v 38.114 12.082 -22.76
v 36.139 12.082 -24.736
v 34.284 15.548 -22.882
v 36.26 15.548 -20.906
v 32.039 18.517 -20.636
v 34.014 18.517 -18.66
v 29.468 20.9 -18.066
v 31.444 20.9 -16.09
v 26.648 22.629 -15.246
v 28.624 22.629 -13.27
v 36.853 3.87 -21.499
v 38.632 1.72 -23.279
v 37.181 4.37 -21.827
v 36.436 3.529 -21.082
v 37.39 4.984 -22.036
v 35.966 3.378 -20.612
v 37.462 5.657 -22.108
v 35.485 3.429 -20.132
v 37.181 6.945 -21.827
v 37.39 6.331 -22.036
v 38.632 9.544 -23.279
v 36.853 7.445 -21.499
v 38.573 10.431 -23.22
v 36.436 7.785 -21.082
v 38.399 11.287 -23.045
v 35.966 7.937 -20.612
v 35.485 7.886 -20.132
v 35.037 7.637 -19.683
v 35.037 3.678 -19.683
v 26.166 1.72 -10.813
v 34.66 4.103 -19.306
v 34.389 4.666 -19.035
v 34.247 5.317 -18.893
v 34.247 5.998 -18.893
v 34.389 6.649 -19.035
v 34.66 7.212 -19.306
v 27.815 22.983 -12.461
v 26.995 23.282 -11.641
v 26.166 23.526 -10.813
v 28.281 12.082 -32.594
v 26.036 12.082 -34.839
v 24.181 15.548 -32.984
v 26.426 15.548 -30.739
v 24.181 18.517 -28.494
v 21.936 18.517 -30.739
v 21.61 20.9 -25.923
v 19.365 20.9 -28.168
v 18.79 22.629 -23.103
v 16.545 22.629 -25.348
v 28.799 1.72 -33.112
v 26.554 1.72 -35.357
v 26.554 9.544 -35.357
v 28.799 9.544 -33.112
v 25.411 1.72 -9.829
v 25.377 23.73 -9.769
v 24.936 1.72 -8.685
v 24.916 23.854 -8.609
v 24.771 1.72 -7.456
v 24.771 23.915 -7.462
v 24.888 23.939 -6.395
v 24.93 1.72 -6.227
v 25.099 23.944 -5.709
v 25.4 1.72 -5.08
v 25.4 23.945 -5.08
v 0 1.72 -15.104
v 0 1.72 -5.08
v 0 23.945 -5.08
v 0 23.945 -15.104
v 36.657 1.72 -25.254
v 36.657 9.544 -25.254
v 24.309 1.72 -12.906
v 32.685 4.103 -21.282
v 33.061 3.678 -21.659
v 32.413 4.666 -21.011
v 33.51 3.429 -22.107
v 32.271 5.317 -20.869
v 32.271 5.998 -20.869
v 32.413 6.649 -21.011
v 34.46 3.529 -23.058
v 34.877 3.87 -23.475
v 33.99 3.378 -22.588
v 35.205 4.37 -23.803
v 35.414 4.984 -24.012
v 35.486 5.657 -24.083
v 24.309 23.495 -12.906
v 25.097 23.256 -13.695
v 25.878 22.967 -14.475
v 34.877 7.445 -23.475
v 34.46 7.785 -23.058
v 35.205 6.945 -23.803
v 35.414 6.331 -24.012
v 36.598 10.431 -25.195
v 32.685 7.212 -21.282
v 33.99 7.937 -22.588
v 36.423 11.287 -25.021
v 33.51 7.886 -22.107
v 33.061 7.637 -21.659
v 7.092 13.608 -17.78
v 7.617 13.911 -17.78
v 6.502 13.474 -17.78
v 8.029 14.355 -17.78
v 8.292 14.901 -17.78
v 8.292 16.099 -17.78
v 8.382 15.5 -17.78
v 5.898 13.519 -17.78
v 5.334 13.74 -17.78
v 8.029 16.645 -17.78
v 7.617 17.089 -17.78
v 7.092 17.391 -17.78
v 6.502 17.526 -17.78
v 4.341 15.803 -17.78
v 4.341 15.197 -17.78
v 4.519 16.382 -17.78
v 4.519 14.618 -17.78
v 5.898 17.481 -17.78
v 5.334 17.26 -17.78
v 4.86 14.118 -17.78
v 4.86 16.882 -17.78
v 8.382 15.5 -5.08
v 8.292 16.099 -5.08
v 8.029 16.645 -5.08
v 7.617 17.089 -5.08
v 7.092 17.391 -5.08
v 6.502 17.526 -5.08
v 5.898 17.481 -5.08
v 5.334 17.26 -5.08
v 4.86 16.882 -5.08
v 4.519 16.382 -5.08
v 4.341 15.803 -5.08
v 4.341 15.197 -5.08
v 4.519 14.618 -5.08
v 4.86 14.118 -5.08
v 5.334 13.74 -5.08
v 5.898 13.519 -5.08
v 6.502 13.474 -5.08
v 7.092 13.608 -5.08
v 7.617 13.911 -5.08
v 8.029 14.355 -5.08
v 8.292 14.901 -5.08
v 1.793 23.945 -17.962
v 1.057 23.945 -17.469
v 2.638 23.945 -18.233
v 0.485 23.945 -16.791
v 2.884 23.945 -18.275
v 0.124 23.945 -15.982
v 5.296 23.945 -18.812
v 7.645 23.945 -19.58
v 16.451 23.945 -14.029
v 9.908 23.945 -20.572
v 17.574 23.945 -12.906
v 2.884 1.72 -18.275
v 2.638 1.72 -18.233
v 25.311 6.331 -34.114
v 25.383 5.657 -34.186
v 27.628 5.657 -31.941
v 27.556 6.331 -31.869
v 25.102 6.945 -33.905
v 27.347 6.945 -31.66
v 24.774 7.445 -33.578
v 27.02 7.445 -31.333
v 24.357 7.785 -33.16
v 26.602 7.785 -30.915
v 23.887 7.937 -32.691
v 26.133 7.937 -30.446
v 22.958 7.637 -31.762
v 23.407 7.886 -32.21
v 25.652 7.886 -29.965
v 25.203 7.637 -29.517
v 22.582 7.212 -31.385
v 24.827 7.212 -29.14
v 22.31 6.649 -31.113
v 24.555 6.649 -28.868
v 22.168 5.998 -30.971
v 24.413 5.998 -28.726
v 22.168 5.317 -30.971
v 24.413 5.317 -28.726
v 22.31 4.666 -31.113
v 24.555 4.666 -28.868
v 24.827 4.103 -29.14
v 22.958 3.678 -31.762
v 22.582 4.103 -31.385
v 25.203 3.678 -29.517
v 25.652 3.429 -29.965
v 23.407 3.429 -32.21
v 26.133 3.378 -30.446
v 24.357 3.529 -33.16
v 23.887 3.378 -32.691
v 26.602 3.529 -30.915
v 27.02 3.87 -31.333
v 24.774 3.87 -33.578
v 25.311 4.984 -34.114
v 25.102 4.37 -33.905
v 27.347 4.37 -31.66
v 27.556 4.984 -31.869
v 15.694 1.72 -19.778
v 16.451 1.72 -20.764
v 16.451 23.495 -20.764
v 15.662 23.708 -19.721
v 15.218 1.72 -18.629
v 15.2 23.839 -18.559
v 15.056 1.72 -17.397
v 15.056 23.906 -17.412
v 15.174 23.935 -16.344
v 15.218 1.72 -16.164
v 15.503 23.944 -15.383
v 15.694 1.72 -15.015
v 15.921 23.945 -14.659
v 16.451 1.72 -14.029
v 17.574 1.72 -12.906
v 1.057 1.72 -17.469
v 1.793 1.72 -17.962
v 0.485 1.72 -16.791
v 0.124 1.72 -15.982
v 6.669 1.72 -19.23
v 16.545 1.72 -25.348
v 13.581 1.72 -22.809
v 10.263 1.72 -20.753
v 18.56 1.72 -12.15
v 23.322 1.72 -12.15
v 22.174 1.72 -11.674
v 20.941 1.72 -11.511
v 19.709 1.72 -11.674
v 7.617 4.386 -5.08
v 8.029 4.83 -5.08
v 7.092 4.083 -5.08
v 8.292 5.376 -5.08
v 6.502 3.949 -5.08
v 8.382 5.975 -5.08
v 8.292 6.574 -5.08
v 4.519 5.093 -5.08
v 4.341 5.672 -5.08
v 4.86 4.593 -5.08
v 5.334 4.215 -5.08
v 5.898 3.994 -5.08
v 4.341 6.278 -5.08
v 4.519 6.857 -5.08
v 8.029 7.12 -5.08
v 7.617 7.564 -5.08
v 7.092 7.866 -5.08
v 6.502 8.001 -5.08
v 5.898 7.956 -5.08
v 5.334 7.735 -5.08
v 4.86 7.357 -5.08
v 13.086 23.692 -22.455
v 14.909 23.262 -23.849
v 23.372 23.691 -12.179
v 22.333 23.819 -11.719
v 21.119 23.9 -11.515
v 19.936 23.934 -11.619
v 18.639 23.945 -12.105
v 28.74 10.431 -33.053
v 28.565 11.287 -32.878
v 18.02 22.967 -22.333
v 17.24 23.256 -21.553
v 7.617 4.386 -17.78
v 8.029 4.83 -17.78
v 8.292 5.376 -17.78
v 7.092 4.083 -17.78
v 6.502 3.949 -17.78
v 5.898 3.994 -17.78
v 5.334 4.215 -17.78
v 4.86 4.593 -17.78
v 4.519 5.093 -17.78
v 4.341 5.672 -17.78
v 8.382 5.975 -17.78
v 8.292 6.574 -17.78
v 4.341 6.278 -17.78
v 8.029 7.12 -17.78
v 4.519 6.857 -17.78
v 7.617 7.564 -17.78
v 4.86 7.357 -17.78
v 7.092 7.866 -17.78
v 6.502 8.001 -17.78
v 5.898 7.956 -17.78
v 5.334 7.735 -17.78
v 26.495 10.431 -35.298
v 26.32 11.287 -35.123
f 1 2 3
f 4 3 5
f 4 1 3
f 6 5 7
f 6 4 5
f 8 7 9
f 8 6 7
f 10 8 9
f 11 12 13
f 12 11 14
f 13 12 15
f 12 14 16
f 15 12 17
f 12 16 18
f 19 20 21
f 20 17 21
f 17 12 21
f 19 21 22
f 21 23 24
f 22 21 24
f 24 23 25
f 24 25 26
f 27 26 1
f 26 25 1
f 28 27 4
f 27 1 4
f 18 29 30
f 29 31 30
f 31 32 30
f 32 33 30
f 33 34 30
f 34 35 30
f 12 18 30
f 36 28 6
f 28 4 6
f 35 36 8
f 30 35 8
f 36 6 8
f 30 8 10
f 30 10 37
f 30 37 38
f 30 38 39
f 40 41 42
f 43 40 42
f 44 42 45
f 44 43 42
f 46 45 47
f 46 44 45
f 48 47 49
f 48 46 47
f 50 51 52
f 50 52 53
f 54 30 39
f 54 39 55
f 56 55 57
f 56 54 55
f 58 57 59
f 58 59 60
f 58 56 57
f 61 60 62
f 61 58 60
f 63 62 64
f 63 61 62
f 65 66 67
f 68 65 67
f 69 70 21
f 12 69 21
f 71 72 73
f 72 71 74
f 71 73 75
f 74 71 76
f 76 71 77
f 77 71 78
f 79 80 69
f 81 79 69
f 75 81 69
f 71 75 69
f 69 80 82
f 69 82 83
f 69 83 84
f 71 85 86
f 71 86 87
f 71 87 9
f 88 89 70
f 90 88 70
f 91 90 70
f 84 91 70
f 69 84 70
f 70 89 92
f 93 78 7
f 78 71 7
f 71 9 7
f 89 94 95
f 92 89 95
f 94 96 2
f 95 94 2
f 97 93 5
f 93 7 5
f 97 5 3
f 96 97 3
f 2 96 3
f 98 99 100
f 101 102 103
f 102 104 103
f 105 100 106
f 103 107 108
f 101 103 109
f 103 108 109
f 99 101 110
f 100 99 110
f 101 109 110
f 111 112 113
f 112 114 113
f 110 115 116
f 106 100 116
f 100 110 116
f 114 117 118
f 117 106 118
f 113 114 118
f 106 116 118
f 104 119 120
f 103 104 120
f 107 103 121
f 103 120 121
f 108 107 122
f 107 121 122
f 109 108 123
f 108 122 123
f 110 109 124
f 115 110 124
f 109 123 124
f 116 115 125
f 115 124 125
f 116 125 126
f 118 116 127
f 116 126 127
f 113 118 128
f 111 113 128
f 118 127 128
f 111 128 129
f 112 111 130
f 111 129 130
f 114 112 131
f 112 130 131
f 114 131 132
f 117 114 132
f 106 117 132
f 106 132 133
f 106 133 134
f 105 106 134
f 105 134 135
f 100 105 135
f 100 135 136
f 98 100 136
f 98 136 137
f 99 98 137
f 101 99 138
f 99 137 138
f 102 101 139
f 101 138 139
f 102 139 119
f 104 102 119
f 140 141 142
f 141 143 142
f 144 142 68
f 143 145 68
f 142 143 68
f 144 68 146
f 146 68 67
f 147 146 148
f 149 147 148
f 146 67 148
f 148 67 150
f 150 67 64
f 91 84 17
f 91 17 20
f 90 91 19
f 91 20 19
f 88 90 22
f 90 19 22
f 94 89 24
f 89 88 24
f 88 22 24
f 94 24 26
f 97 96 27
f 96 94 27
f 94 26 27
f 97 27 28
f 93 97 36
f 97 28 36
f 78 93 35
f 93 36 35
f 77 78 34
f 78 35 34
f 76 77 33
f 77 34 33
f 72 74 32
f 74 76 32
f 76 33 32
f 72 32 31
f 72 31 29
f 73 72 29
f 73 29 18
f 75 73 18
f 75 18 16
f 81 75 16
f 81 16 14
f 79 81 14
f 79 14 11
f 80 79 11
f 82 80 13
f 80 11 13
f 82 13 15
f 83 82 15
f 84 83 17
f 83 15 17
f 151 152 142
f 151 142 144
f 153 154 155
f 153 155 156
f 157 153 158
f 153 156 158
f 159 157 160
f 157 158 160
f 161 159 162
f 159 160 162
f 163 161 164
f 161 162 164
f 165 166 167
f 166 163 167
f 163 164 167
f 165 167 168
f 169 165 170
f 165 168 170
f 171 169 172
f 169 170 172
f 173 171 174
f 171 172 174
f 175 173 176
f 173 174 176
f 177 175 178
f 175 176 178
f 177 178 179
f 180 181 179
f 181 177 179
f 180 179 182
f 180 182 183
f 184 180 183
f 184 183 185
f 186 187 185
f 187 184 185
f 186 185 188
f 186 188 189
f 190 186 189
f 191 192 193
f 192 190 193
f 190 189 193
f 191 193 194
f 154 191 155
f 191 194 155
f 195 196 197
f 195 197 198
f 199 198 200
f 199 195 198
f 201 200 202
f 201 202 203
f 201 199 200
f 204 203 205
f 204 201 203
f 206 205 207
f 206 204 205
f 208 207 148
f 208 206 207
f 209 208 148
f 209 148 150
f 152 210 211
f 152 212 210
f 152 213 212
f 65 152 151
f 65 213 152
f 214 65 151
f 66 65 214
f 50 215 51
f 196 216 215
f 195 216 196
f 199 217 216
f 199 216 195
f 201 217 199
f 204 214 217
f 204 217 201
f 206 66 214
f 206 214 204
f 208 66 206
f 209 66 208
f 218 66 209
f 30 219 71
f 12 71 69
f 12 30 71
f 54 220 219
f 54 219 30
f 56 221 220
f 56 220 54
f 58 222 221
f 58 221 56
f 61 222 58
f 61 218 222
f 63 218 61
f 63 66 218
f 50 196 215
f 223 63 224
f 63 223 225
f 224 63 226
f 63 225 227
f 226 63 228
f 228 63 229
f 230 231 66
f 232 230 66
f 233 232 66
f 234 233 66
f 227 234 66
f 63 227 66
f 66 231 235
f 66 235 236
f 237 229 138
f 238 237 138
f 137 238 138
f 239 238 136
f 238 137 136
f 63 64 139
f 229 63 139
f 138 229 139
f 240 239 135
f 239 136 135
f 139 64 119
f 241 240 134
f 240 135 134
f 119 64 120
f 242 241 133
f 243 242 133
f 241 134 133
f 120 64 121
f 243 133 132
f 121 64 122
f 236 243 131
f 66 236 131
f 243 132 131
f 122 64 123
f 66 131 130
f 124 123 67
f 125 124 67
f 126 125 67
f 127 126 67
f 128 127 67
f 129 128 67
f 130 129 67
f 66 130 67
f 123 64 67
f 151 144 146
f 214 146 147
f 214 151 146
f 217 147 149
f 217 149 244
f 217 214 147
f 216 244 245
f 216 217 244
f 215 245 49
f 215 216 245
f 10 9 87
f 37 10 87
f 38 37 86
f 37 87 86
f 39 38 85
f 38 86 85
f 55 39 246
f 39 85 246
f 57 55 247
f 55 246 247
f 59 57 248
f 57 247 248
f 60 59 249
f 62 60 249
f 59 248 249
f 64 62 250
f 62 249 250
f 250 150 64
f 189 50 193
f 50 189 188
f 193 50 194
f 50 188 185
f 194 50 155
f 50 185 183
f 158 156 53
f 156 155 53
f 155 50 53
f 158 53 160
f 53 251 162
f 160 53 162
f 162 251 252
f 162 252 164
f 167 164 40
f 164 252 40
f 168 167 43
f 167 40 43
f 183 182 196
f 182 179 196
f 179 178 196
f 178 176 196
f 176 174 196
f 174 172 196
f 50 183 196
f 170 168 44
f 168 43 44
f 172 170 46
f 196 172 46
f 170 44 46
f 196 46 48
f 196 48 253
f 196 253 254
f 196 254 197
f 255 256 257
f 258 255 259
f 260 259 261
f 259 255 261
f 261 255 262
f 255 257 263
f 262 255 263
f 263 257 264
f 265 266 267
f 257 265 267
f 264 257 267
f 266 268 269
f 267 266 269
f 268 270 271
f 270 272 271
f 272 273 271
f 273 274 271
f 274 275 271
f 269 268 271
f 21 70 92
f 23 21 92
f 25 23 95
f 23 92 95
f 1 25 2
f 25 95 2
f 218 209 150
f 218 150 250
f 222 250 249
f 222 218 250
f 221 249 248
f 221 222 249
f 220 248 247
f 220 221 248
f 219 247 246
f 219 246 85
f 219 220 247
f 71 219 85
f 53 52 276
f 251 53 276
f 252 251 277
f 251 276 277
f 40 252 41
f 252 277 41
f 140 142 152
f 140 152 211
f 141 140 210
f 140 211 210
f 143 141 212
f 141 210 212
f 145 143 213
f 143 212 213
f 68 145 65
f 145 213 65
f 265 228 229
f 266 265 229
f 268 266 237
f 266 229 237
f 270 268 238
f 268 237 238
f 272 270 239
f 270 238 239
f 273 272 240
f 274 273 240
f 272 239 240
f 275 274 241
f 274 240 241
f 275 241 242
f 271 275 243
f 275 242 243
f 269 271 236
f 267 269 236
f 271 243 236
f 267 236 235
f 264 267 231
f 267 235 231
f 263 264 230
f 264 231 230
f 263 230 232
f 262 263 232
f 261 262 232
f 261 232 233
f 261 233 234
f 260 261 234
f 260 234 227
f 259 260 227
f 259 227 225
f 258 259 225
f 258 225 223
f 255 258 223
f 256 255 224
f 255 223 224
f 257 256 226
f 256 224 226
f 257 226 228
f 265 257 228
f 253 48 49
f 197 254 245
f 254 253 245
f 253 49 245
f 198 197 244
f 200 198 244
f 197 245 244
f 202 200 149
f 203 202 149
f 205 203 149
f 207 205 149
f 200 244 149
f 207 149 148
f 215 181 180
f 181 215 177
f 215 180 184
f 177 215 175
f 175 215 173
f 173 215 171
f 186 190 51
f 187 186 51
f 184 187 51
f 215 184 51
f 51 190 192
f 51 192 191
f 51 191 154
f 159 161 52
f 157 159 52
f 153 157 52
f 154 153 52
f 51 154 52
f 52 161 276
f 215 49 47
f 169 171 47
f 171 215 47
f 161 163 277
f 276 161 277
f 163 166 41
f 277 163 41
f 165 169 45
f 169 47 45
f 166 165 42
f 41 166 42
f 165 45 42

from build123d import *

# Parameters (mm, degrees)
SKETCH2_W               = 12.7
SKETCH2_H               = 22.225
SKETCH2_R               = 2.032
BOSS_EXTRUDE1_DEPTH     = 12.7
BOSS_EXTRUDE2_DEPTH     = 22.225
CUT_EXTRUDE1_DEPTH      = 55.959756427
CUT_EXTRUDE1_DEPTH_BACK = 55.959756427
SKETCH5_R               = 2.286
CUT_EXTRUDE2_DEPTH      = 55.959756427
CUT_EXTRUDE2_DEPTH_BACK = 55.959756427
FILLET1_START           = -2.63267612
FILLET1_DEPTH           = 17.0815
FILLET1_START_2         = 1.720391704
FILLET1_2_DEPTH         = 23.279608296
FILLET1_3_DEPTH         = 22.225
FILLET1_START_3         = -3.948943888
FILLET1_4_DEPTH         = 21.90945623


with BuildPart() as part:
    # Sketch2 → Boss-Extrude1 (new body)
    with BuildSketch(Plane.XY):
        with Locations((6.35, 12.832891704)):
            Rectangle(SKETCH2_W, SKETCH2_H)
        with Locations((6.35, 15.499891704)):
            Circle(SKETCH2_R, mode=Mode.SUBTRACT)
        with Locations((6.35, 5.974891704)):
            Circle(SKETCH2_R, mode=Mode.SUBTRACT)
    extrude(amount=BOSS_EXTRUDE1_DEPTH)

    # Sketch4 → Boss-Extrude2 (add)
    with BuildSketch(Plane(origin=(0, 23.945391704, 0), x_dir=(1, 0, 0), z_dir=(0, 1, 0))):
        Polygon((28.798929105, -28.031967319), (13.083480893, -12.316519107), (20.941204999, -4.458795001), (36.656653211, -20.174243213), (38.632309558, -18.198586866), (22.916861346, -2.483138654), (25.4, 0), (12.7, 0), (12.7, -12.7), (0, -12.7), (10.838416863, -14.561583137), (26.553865075, -30.277031349), align=None)
    extrude(amount=-BOSS_EXTRUDE2_DEPTH)

    # Sketch5 → Cut-Extrude1 (cut, two sides: drawn at the far end of the back side and taken through both)
    with BuildSketch(Plane(origin=(-1.861583137, 0, 1.861583137), x_dir=(0.7071067811865527, 0, 0.7071067811865424), z_dir=(-0.7071067811865424, 0, 0.7071067811865527)).offset(-CUT_EXTRUDE1_DEPTH_BACK)):
        with Locations((36.243802071, 5.657391696)):
            Circle(SKETCH5_R)
    extrude(amount=CUT_EXTRUDE1_DEPTH + CUT_EXTRUDE1_DEPTH_BACK, mode=Mode.SUBTRACT)

    # Sketch6 → Cut-Extrude2 (cut, two sides: drawn at the far end of the back side and taken through both)
    with BuildSketch(Plane(origin=(-1.861583137, 0, 1.861583137), x_dir=(0.7071067811865527, 0, 0.7071067811865424), z_dir=(-0.7071067811865424, 0, 0.7071067811865527)).offset(-CUT_EXTRUDE2_DEPTH_BACK)):
        with BuildLine():
            Line((17.960512242, 23.945391704), (40.185512242, 23.945391704))
            Line((40.185512242, 23.945391704), (40.185512242, 10.842113828))
            ThreePointArc((40.185512242, 10.842113828), (30.860575382, 20.425710965), (17.960512242, 23.945391704))
        make_face()
    extrude(amount=CUT_EXTRUDE2_DEPTH + CUT_EXTRUDE2_DEPTH_BACK, mode=Mode.SUBTRACT)

    # Fillet1: read off the stored shape, not the designer's step
    # Fillet1 outline → Fillet1 (cut)
    with BuildSketch(Plane(origin=(0, 0, 0), x_dir=(0.707106781186553, 0, 0.707106781186542), z_dir=(0.707106781186542, 0, -0.707106781186553)).offset(FILLET1_START)):
        with BuildLine():
            Line((40.185512242, -10.842113828), (40.185512242, -9.543914332))
            ThreePointArc((40.185512242, -9.543914332), (39.998674237, -10.864794174), (39.452819934, -12.082034938))
            ThreePointArc((39.452819934, -12.082034938), (39.827956058, -11.467268539), (40.185512242, -10.842113828))
        make_face()
    extrude(amount=FILLET1_DEPTH, mode=Mode.SUBTRACT)

    # Fillet1 2 outline → Fillet1 2 (cut)
    with BuildSketch(Plane(origin=(0, 0, 0), x_dir=(1, 0, 0), z_dir=(0, 1, 0)).offset(FILLET1_START_2)):
        with BuildLine():
            ThreePointArc((2.63753897, -13.153018013), (0.747340245, -12.070077877), (0, -10.023839104))
            Line((0, -10.023839104), (0, -12.7))
            Line((0, -12.7), (2.63753897, -13.153018013))
        make_face()
    extrude(amount=FILLET1_2_DEPTH, mode=Mode.SUBTRACT)

    # Fillet1 3 outline → Fillet1 3 (add)
    with BuildSketch(Plane(origin=(0, 0, 0), x_dir=(1, 0, 0), z_dir=(0, 1, 0)).offset(FILLET1_START_2)):
        with BuildLine():
            Line((10.838416863, -14.561583137), (2.884336106, -13.195407357))
            ThreePointArc((2.884336106, -13.195407357), (10.263075725, -15.672812319), (16.545160109, -20.268326383))
            Line((16.545160109, -20.268326383), (10.838416863, -14.561583137))
        make_face()
        with BuildLine():
            Line((22.916861346, -2.483138654), (26.166236401, -5.732513709))
            ThreePointArc((26.166236401, -5.732513709), (24.81331492, -2.995885603), (25.4, 0))
            Line((25.4, 0), (22.916861346, -2.483138654))
        make_face()
        with BuildLine():
            Line((20.941204999, -4.458795001), (17.573608954, -7.826391046))
            ThreePointArc((17.573608954, -7.826391046), (20.941205, -6.431487092), (24.308801045, -7.826391046))
            Line((24.308801045, -7.826391046), (20.941204999, -4.458795001))
        make_face()
        with BuildLine():
            ThreePointArc((16.451076939, -15.684115152), (15.056172984, -12.316519106), (16.451076939, -8.948923061))
            Line((16.451076939, -8.948923061), (13.083480893, -12.316519107))
            Line((13.083480893, -12.316519107), (16.451076939, -15.684115152))
        make_face()
    extrude(amount=FILLET1_3_DEPTH)

    # Fillet1 4 outline → Fillet1 4 (cut)
    with BuildSketch(Plane(origin=(0, 0, 0), x_dir=(0.707106781186553, 0, 0.707106781186542), z_dir=(0.707106781186542, 0, -0.707106781186553)).offset(FILLET1_START_3)):
        with BuildLine():
            Line((17.960512242, -23.945391704), (26.031065938, -23.945391704))
            Line((26.031065938, -23.945391704), (26.031065938, -22.629124036))
            ThreePointArc((26.031065938, -22.629124036), (22.049106057, -23.61416512), (17.960512242, -23.945391704))
        make_face()
    extrude(amount=FILLET1_4_DEPTH, mode=Mode.SUBTRACT)


with BuildPart() as body_2:
    # Mirror3: mirrored copy
    add(part.part.mirror(Plane(origin=(0, 0, -2.54), x_dir=(1, 0, 0), z_dir=(0, 0, -1))))


solid = body_2.part
